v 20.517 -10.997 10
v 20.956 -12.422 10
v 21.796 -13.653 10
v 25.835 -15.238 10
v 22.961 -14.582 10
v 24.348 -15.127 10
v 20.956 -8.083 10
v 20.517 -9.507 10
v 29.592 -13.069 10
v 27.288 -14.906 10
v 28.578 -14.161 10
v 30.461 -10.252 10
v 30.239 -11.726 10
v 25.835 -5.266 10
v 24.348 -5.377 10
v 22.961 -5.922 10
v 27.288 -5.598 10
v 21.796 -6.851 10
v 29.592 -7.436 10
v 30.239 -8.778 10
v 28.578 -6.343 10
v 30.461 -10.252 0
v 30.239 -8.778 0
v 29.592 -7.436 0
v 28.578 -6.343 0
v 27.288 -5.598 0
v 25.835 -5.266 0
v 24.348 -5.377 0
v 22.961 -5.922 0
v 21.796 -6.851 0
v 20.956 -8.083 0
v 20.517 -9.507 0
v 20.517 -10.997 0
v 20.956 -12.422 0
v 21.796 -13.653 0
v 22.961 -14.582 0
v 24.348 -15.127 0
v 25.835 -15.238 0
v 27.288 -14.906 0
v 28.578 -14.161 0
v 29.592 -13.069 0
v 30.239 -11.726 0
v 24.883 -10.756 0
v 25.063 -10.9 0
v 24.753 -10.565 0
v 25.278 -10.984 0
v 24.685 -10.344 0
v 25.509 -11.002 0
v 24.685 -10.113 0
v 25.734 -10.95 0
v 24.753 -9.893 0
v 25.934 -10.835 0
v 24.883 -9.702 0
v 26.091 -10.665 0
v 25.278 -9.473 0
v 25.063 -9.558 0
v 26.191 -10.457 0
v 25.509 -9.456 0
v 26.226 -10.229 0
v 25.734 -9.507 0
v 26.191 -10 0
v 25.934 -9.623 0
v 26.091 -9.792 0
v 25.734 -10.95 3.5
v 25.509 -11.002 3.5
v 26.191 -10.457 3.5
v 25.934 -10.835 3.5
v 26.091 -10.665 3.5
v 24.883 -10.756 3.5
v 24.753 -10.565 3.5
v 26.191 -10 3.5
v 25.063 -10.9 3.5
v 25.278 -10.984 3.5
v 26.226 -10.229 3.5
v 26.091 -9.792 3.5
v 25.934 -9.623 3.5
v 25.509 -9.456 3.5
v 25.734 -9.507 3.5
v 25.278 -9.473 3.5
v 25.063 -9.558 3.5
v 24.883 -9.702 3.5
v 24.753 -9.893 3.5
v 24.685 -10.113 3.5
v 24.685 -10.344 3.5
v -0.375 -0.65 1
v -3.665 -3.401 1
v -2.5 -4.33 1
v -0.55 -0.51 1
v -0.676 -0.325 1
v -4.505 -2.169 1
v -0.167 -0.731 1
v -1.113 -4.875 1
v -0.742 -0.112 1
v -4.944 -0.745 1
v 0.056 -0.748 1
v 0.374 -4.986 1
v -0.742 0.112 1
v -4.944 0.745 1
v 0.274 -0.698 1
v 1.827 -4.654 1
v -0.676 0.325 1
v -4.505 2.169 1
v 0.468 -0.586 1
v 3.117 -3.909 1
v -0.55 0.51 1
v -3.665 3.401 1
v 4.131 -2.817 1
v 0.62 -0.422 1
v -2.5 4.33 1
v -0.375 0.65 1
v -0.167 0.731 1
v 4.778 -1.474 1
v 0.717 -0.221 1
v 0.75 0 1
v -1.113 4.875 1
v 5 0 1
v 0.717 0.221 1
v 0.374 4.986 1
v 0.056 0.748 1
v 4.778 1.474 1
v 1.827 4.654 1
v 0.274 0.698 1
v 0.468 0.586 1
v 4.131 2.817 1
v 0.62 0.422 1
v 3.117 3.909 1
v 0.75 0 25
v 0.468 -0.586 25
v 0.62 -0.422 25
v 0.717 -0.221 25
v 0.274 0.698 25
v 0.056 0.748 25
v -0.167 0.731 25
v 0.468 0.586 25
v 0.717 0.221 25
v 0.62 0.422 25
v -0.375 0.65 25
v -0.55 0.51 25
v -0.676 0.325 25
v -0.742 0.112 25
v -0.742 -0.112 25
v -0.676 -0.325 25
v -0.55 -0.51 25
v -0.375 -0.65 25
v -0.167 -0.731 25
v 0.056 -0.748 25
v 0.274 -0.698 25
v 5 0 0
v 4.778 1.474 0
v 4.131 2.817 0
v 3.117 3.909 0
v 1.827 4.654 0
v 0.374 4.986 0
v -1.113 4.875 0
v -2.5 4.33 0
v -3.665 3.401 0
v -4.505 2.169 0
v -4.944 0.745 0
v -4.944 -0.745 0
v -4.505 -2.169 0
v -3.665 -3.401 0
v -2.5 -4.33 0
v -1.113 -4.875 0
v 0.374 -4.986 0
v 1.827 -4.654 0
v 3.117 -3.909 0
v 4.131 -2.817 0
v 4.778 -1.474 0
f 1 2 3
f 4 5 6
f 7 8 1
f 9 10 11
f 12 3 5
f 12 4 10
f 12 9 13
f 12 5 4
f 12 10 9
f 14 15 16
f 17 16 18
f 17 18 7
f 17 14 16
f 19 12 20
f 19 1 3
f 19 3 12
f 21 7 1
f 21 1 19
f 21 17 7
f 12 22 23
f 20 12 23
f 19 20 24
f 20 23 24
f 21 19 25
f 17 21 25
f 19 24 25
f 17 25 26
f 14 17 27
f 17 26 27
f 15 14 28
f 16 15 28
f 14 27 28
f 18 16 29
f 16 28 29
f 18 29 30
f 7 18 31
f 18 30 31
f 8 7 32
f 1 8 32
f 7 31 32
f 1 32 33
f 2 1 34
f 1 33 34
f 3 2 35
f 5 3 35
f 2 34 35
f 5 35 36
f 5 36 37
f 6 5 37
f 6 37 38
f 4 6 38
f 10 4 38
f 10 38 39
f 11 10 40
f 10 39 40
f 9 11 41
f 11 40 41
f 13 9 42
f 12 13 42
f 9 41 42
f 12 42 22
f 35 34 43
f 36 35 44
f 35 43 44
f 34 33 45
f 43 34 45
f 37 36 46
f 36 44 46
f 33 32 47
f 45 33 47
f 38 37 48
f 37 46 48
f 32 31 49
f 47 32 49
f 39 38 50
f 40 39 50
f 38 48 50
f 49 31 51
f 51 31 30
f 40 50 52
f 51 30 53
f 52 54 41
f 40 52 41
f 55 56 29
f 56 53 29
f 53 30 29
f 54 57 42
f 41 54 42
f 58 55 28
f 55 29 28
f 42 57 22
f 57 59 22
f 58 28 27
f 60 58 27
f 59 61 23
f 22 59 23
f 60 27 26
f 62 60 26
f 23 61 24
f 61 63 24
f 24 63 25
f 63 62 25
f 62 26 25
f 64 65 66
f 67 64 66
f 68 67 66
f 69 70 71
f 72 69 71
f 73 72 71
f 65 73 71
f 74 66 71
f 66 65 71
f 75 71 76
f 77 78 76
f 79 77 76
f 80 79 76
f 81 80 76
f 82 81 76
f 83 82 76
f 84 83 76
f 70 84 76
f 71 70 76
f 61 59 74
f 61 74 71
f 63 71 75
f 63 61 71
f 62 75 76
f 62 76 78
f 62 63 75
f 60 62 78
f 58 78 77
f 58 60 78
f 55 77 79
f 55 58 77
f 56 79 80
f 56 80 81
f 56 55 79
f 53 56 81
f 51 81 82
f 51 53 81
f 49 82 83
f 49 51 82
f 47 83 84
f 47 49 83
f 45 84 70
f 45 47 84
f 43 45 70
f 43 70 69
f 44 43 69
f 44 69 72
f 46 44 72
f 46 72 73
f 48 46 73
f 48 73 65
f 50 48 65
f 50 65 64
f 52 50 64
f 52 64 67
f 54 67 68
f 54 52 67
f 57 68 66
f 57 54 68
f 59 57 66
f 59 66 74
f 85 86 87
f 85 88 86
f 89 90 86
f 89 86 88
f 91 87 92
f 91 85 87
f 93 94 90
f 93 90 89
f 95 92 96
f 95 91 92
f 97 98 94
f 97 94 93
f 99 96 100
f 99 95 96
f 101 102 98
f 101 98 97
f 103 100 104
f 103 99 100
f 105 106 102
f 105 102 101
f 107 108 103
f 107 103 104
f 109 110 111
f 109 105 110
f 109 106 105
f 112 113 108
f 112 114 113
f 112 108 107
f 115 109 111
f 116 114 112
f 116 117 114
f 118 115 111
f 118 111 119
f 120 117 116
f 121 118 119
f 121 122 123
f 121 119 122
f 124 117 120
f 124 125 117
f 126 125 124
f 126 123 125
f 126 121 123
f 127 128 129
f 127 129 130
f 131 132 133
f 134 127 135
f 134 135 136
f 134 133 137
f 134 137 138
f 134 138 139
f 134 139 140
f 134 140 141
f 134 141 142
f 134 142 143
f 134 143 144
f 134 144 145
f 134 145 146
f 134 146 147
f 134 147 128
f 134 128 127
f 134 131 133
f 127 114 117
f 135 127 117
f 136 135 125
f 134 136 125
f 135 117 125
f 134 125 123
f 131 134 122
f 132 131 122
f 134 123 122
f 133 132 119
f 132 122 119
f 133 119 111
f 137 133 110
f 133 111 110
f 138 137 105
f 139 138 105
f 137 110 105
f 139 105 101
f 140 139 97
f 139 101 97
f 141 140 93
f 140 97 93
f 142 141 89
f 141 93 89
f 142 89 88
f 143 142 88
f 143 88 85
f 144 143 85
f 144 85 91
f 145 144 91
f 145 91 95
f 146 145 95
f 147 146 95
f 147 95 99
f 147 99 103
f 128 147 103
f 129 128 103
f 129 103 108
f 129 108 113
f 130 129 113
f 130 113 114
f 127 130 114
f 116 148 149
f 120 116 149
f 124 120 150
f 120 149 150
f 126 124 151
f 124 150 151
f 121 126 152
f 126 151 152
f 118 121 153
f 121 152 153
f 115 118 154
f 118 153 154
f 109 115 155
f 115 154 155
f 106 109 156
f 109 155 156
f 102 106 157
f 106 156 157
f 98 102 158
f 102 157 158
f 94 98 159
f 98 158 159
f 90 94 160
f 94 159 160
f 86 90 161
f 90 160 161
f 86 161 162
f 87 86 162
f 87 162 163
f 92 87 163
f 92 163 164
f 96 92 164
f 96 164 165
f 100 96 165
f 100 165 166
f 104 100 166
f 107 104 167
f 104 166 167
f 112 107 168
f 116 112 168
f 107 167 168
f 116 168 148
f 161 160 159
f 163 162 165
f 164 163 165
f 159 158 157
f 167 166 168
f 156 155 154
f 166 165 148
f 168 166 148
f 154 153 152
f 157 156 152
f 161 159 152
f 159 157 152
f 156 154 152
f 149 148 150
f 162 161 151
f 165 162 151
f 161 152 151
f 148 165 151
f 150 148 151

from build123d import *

# Parameters (mm, degrees)
F0_R     = 5
F0_R_2   = 0.75
F1_DEPTH = 1
F2_R     = 0.75
F3_DEPTH = 25
F4_R     = 5
F6_DEPTH = 10
F5_R     = 0.775
F7_DEPTH = 3.5


with BuildPart() as f1:
    # F0 (on Top) → F1 (new body)
    with BuildSketch(Plane.XY):
        Circle(F0_R)
        Circle(F0_R_2, mode=Mode.SUBTRACT)
    extrude(amount=F1_DEPTH)

    # F2 (on Top) → F3 (join)
    with BuildSketch(Plane.XY):
        Circle(F2_R)
    extrude(amount=F3_DEPTH)


with BuildPart() as f6:
    # F4 (on Top) → F6 (new body)
    with BuildSketch(Plane.XY):
        with Locations((25.460983, -10.252128)):
            Circle(F4_R)
    extrude(amount=F6_DEPTH)

    # F5 (on face) → F7 (cut)
    with BuildSketch(Plane.XY):
        with Locations((25.450855, -10.22889)):
            Circle(F5_R)
    extrude(amount=F7_DEPTH, mode=Mode.SUBTRACT)


solid = Compound([f1.part, f6.part])
